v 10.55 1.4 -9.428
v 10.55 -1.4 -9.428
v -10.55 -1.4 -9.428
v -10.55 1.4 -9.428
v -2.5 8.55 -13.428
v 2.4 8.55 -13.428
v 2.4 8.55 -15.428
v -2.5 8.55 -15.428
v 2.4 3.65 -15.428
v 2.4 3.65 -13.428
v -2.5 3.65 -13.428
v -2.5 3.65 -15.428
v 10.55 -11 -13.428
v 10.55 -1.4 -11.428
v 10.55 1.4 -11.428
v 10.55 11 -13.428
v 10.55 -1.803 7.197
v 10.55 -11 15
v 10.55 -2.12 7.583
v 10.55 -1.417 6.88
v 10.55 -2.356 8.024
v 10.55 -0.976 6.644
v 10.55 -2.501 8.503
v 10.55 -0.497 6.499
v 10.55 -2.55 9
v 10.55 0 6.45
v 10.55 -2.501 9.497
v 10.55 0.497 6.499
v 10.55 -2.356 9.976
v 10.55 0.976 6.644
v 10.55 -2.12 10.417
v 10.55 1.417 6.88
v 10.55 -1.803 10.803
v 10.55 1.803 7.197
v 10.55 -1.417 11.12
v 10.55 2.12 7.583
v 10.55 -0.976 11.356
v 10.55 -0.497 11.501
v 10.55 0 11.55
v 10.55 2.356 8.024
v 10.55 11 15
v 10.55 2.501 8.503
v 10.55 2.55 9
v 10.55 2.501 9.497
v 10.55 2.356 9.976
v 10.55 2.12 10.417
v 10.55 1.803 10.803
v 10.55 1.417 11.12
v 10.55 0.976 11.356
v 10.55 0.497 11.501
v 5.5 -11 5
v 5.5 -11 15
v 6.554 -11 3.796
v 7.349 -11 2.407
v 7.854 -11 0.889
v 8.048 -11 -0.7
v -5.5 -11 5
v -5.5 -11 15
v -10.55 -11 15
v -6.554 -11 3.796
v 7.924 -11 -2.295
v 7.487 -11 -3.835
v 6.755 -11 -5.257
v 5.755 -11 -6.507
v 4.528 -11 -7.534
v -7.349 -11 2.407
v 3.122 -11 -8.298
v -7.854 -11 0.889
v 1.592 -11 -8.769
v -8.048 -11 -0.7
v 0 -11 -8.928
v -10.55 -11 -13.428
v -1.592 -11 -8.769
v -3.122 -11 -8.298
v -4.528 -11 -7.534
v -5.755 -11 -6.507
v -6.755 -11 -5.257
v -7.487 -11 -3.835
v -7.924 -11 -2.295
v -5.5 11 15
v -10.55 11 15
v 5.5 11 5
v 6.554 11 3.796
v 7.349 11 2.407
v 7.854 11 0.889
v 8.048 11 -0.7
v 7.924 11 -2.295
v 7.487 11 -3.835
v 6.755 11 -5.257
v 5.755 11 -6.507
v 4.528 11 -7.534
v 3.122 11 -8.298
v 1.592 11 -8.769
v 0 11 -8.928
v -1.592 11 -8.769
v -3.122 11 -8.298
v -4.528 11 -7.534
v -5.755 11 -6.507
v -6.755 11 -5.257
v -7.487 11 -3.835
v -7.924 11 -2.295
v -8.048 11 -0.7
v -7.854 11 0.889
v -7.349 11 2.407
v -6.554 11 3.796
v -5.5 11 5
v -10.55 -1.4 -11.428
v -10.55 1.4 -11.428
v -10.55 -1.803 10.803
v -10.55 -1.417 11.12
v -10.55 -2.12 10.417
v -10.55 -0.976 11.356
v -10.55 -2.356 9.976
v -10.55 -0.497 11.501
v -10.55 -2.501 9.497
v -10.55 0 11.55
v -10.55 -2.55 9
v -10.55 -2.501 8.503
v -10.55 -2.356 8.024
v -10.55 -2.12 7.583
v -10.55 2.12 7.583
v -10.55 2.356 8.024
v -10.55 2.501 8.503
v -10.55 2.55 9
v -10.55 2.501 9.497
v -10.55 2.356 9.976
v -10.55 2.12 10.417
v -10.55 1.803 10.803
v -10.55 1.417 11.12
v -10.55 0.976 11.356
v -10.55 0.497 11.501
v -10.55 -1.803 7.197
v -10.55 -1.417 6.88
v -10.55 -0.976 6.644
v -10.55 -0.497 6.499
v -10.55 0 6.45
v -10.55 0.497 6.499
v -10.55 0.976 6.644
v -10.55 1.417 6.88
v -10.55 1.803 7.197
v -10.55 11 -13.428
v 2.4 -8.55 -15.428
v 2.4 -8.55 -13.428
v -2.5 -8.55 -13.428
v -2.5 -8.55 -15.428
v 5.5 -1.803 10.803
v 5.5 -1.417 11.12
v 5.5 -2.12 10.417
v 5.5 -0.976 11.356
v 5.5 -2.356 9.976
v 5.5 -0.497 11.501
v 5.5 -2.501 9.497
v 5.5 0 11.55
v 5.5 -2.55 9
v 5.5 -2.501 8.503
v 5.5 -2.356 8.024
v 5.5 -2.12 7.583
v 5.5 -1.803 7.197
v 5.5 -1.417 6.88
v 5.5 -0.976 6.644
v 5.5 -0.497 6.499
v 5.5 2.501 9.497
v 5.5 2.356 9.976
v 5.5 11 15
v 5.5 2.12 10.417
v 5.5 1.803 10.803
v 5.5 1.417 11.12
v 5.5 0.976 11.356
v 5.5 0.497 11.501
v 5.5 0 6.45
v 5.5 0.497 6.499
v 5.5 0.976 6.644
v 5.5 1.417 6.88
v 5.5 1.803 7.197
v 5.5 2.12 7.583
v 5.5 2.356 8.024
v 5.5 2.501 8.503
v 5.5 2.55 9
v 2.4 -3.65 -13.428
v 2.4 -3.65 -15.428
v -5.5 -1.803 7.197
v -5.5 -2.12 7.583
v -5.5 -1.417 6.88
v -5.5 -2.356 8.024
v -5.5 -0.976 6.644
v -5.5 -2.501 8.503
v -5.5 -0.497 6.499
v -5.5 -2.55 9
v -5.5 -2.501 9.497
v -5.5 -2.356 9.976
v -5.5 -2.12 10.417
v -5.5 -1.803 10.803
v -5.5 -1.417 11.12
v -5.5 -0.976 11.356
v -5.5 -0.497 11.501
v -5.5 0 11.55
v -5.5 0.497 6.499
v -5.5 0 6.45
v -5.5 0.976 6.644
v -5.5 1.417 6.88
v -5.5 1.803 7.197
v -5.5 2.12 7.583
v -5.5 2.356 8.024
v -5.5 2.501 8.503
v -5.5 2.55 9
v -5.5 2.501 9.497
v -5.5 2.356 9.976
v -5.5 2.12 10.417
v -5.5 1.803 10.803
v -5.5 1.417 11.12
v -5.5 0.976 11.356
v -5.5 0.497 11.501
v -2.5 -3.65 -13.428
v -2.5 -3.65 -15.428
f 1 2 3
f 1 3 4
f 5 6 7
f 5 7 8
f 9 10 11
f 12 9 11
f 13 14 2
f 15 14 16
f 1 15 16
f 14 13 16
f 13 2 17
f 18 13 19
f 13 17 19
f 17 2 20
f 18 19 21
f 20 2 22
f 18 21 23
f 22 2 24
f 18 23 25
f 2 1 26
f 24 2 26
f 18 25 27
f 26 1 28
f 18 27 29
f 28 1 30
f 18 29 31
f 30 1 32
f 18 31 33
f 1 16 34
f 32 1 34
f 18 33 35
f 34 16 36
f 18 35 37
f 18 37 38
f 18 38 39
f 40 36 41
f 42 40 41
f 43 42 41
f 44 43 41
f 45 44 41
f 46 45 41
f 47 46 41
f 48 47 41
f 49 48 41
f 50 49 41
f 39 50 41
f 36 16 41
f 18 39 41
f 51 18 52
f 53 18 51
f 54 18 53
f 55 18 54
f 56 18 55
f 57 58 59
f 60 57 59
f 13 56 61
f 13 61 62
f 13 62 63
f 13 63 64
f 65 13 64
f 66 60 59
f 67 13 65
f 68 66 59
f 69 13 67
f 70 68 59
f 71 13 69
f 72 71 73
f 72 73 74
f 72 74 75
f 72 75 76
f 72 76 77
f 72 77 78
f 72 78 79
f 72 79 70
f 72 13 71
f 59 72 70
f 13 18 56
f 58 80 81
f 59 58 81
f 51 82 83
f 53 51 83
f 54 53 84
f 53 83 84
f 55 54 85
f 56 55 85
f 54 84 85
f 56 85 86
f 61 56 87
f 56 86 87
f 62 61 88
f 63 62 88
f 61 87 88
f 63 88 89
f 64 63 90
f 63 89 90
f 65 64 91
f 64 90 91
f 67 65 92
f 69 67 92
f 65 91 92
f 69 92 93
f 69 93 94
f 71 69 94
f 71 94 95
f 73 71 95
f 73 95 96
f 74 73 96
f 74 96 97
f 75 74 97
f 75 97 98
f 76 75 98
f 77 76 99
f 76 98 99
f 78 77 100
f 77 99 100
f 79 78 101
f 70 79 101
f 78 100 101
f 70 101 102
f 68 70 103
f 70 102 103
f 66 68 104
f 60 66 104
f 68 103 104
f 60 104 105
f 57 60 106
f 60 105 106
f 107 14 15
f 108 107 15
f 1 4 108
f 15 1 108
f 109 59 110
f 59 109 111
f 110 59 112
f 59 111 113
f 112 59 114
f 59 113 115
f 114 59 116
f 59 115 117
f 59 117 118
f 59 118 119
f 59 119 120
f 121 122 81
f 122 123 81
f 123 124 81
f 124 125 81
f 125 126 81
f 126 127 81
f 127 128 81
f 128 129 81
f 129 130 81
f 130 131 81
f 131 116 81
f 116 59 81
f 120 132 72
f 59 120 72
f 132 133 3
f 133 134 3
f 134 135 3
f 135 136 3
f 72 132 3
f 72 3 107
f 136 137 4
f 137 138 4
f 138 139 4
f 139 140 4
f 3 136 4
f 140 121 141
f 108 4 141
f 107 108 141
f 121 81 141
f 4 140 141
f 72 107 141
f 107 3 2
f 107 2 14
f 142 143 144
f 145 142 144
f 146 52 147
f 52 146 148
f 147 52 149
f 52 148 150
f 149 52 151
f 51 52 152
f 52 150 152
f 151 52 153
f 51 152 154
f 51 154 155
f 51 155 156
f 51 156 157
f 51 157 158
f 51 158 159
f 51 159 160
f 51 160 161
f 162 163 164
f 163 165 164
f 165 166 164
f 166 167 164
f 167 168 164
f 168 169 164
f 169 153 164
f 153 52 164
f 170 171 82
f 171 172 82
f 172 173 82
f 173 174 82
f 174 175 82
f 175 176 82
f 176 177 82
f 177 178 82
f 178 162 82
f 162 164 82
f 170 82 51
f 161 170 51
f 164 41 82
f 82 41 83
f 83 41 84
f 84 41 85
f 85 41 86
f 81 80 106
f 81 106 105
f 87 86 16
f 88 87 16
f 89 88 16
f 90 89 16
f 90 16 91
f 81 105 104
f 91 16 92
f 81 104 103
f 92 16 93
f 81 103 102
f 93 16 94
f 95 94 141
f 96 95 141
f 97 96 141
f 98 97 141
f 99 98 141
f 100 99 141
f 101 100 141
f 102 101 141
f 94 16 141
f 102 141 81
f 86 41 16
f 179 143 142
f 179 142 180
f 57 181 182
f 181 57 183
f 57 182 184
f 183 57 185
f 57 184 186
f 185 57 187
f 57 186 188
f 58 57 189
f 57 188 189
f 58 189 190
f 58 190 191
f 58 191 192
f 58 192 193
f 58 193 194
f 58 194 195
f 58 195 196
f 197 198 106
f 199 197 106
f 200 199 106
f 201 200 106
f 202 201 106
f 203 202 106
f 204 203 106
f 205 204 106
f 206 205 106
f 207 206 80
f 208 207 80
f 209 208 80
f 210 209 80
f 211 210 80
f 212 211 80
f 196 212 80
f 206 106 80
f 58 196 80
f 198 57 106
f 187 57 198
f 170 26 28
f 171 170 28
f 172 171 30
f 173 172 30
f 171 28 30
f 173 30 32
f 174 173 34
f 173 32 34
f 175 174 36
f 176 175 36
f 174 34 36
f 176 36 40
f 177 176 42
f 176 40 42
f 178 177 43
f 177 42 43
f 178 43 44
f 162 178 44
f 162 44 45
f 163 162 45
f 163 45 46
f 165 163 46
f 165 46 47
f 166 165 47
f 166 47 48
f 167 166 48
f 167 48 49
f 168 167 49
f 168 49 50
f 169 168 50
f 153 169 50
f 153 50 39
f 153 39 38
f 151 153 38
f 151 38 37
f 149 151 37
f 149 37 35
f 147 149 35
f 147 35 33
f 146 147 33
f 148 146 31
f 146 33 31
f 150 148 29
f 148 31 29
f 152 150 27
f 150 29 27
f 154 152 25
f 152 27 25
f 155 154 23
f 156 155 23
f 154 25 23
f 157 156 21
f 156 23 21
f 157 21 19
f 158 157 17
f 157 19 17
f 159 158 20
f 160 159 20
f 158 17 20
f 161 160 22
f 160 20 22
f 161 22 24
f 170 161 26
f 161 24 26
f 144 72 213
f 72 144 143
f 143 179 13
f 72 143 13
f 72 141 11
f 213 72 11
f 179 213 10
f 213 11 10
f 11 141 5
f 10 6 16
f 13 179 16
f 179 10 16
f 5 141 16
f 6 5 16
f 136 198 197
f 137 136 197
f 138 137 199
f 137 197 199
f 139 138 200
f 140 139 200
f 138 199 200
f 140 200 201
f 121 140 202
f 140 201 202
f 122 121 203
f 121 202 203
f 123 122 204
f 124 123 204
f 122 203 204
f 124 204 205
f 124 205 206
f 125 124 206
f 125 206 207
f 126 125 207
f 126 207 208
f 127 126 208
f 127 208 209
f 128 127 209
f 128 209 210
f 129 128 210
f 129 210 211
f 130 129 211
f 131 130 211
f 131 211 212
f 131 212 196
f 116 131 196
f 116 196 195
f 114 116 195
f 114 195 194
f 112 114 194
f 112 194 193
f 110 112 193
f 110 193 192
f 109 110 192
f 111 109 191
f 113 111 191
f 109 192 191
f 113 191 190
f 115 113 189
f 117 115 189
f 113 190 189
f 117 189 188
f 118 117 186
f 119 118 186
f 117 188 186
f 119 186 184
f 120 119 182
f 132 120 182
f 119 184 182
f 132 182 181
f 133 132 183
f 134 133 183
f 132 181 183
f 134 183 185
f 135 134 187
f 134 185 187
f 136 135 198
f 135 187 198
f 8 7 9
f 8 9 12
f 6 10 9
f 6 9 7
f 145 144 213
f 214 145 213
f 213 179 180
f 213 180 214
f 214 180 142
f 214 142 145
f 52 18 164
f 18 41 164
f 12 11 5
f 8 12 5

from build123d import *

# Parameters (mm, degrees)
BOSS_EXTRUDE1_DEPTH = 11
CUT_EXTRUDE1_REACH  = 30.128
SKETCH2_R           = 2.55
SKETCH4_W           = 2
SKETCH4_H           = 2.8
CUT_EXTRUDE3_DEPTH  = 21.1
SKETCH5_W           = 4.9
SKETCH5_H           = 4.9
BOSS_EXTRUDE2_DEPTH = 2


with BuildPart() as part:
    # Sketch1 → Boss-Extrude1 (new, symmetric)
    with BuildSketch(Plane(origin=(0, 0, 0), x_dir=(1, 0, 0), z_dir=(0, 1, 0))):
        with BuildLine():
            Line((-5.5, -15), (-10.55, -15))
            Line((-10.55, -15), (-10.55, 13.42813746))
            Line((-10.55, 13.42813746), (10.55, 13.42813746))
            Line((10.55, 13.42813746), (10.55, -15))
            Line((10.55, -15), (5.5, -15))
            Line((5.5, -15), (5.5, -5))
            ThreePointArc((5.5, -5), (0, 8.92813746), (-5.5, -5))
            Line((-5.5, -5), (-5.5, -15))
        make_face()
    extrude(amount=BOSS_EXTRUDE1_DEPTH, both=True)

    # Cut-Extrude1: up to this face of the body (flat: up to its plane)
    cut_extrude1_end = Plane(part.part.faces().sort_by_distance((-10.55, 0, 0.78593127))[0])
    # Sketch2 → Cut-Extrude1 (cut, up to the picked face)
    with BuildSketch(Plane(origin=(10.55, 0, 0), x_dir=(0, 0, -1), z_dir=(1, 0, 0)), mode=Mode.PRIVATE) as cut_extrude1_sk1:
        with Locations((-9, 0)):
            Circle(SKETCH2_R)
    cut_extrude1_tool1 = split(extrude(cut_extrude1_sk1.sketch, amount=-CUT_EXTRUDE1_REACH, mode=Mode.PRIVATE), bisect_by=cut_extrude1_end, keep=Keep.BOTH, mode=Mode.PRIVATE)
    add(cut_extrude1_tool1.solids().sort_by(Axis((10.55, 0, 9), (-1, 0, 0)))[0], mode=Mode.SUBTRACT)

    # Sketch4 → Cut-Extrude3 (cut)
    with BuildSketch(Plane(origin=(10.55, 0, 0), x_dir=(0, 0, -1), z_dir=(1, 0, 0))):
        with Locations((10.42813746, 0)):
            Rectangle(SKETCH4_W, SKETCH4_H)
    extrude(amount=-CUT_EXTRUDE3_DEPTH, mode=Mode.SUBTRACT)

    # Sketch5 → Boss-Extrude2 (add)
    with BuildSketch(Plane(origin=(0, 0, -13.42813746), x_dir=(-1, 0, 0), z_dir=(0, 0, -1))):
        with Locations((0.05, 6.1)):
            Rectangle(SKETCH5_W, SKETCH5_H)
        with Locations((0.05, -6.1)):
            Rectangle(SKETCH5_W, SKETCH5_H)
    extrude(amount=BOSS_EXTRUDE2_DEPTH)


solid = part.part
